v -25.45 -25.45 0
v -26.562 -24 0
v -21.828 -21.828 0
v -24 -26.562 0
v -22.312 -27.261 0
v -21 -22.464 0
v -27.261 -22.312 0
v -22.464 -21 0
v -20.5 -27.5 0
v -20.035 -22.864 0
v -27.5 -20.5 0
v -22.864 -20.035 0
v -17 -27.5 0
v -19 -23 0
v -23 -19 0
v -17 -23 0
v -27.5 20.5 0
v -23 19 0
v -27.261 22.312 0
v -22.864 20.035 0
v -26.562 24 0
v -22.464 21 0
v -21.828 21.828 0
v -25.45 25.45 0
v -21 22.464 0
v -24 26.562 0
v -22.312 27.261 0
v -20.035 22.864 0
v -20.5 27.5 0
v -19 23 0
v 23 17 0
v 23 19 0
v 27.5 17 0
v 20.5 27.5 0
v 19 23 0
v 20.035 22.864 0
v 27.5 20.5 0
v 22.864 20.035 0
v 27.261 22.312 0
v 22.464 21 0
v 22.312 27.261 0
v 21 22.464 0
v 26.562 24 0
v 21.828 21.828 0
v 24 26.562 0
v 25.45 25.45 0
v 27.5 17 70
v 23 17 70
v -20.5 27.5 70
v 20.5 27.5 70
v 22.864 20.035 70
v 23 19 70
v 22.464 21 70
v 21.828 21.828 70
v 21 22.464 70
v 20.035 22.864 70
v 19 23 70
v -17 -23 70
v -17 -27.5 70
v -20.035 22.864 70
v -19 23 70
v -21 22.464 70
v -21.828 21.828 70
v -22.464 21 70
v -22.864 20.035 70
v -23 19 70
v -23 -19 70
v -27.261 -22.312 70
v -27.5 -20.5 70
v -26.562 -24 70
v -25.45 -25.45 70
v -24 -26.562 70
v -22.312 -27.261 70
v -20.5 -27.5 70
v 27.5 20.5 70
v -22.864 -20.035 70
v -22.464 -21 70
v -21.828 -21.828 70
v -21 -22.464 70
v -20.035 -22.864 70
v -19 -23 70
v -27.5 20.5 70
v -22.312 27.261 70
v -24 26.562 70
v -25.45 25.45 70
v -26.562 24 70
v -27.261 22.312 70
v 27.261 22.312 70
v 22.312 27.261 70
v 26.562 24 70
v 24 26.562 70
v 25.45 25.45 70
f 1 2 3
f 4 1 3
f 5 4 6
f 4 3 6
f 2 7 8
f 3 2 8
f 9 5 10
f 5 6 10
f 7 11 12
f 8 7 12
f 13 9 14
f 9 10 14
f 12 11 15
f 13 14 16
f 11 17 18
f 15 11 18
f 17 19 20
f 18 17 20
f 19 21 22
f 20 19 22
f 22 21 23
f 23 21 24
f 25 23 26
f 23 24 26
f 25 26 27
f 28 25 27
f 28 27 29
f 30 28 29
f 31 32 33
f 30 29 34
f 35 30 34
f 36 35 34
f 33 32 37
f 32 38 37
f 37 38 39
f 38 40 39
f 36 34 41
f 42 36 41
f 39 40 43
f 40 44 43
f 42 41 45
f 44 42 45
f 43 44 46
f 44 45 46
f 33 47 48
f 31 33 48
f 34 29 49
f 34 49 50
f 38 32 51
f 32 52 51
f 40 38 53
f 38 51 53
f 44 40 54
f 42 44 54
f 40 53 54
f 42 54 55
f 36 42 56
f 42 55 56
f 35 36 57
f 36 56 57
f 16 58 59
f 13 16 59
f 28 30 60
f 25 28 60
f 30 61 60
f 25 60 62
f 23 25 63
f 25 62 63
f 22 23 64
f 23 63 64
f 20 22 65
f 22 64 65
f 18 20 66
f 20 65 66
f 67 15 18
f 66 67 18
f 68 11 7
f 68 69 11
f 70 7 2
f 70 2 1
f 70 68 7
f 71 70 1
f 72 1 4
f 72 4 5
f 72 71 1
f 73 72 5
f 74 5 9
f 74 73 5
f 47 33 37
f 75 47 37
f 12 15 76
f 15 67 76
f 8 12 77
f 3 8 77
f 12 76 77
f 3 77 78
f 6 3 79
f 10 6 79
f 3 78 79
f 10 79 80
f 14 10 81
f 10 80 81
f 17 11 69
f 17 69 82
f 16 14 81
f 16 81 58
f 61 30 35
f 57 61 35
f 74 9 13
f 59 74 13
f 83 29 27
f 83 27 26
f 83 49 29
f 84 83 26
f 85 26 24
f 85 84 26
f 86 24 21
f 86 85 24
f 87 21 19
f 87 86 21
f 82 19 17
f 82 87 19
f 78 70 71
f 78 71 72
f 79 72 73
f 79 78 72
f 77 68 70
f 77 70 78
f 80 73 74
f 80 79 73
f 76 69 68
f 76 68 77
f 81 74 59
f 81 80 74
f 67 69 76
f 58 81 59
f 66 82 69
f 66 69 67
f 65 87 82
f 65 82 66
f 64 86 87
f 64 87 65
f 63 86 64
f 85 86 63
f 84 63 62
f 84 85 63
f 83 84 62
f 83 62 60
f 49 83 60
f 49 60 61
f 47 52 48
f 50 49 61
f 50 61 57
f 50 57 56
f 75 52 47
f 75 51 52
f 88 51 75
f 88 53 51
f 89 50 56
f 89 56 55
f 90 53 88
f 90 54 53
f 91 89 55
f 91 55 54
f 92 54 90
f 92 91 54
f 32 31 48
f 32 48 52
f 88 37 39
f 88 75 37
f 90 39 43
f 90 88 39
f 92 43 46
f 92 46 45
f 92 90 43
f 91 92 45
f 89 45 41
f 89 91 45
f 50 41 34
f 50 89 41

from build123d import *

# Parameters (mm, degrees)
SKETCH_W        = 55
SKETCH_H        = 55
PAD_DEPTH       = 70
SKETCH001_W     = 46
SKETCH001_H     = 46
POCKET_DEPTH    = 70
POCKET001_DEPTH = 70
FILLET_R        = 4
FILLET001_R     = 7


with BuildPart() as part:
    # Sketch → Pad (new body)
    with BuildSketch(Plane.XY):
        Rectangle(SKETCH_W, SKETCH_H)
    extrude(amount=PAD_DEPTH)

    # Sketch001 → Pocket (cut)
    with BuildSketch(Plane.XY):
        Rectangle(SKETCH001_W, SKETCH001_H)
    extrude(amount=POCKET_DEPTH, mode=Mode.SUBTRACT)

    # Sketch002 (on Face5 of Pocket) → Pocket001 (cut)
    with BuildSketch(Plane.XY.offset(70)):
        Polygon((23, -23), (-17, -23), (-17, -27.5), (27.5, -27.5), (27.5, 17), (23, 17), align=None)
    extrude(amount=-POCKET001_DEPTH, mode=Mode.SUBTRACT)

    # Fillet
    fillet_edges = [part.edges().sort_by_distance(p)[0] for p in [
        (-23, -23, 35),
        (-23, 23, 35),
        (23, 23, 35),
    ]]
    fillet(fillet_edges, radius=FILLET_R)

    # Fillet001
    fillet001_edges = [part.edges().sort_by_distance(p)[0] for p in [
        (-27.5, -27.5, 35),
        (-27.5, 27.5, 35),
        (27.5, 27.5, 35),
    ]]
    fillet(fillet001_edges, radius=FILLET001_R)


solid = part.part
